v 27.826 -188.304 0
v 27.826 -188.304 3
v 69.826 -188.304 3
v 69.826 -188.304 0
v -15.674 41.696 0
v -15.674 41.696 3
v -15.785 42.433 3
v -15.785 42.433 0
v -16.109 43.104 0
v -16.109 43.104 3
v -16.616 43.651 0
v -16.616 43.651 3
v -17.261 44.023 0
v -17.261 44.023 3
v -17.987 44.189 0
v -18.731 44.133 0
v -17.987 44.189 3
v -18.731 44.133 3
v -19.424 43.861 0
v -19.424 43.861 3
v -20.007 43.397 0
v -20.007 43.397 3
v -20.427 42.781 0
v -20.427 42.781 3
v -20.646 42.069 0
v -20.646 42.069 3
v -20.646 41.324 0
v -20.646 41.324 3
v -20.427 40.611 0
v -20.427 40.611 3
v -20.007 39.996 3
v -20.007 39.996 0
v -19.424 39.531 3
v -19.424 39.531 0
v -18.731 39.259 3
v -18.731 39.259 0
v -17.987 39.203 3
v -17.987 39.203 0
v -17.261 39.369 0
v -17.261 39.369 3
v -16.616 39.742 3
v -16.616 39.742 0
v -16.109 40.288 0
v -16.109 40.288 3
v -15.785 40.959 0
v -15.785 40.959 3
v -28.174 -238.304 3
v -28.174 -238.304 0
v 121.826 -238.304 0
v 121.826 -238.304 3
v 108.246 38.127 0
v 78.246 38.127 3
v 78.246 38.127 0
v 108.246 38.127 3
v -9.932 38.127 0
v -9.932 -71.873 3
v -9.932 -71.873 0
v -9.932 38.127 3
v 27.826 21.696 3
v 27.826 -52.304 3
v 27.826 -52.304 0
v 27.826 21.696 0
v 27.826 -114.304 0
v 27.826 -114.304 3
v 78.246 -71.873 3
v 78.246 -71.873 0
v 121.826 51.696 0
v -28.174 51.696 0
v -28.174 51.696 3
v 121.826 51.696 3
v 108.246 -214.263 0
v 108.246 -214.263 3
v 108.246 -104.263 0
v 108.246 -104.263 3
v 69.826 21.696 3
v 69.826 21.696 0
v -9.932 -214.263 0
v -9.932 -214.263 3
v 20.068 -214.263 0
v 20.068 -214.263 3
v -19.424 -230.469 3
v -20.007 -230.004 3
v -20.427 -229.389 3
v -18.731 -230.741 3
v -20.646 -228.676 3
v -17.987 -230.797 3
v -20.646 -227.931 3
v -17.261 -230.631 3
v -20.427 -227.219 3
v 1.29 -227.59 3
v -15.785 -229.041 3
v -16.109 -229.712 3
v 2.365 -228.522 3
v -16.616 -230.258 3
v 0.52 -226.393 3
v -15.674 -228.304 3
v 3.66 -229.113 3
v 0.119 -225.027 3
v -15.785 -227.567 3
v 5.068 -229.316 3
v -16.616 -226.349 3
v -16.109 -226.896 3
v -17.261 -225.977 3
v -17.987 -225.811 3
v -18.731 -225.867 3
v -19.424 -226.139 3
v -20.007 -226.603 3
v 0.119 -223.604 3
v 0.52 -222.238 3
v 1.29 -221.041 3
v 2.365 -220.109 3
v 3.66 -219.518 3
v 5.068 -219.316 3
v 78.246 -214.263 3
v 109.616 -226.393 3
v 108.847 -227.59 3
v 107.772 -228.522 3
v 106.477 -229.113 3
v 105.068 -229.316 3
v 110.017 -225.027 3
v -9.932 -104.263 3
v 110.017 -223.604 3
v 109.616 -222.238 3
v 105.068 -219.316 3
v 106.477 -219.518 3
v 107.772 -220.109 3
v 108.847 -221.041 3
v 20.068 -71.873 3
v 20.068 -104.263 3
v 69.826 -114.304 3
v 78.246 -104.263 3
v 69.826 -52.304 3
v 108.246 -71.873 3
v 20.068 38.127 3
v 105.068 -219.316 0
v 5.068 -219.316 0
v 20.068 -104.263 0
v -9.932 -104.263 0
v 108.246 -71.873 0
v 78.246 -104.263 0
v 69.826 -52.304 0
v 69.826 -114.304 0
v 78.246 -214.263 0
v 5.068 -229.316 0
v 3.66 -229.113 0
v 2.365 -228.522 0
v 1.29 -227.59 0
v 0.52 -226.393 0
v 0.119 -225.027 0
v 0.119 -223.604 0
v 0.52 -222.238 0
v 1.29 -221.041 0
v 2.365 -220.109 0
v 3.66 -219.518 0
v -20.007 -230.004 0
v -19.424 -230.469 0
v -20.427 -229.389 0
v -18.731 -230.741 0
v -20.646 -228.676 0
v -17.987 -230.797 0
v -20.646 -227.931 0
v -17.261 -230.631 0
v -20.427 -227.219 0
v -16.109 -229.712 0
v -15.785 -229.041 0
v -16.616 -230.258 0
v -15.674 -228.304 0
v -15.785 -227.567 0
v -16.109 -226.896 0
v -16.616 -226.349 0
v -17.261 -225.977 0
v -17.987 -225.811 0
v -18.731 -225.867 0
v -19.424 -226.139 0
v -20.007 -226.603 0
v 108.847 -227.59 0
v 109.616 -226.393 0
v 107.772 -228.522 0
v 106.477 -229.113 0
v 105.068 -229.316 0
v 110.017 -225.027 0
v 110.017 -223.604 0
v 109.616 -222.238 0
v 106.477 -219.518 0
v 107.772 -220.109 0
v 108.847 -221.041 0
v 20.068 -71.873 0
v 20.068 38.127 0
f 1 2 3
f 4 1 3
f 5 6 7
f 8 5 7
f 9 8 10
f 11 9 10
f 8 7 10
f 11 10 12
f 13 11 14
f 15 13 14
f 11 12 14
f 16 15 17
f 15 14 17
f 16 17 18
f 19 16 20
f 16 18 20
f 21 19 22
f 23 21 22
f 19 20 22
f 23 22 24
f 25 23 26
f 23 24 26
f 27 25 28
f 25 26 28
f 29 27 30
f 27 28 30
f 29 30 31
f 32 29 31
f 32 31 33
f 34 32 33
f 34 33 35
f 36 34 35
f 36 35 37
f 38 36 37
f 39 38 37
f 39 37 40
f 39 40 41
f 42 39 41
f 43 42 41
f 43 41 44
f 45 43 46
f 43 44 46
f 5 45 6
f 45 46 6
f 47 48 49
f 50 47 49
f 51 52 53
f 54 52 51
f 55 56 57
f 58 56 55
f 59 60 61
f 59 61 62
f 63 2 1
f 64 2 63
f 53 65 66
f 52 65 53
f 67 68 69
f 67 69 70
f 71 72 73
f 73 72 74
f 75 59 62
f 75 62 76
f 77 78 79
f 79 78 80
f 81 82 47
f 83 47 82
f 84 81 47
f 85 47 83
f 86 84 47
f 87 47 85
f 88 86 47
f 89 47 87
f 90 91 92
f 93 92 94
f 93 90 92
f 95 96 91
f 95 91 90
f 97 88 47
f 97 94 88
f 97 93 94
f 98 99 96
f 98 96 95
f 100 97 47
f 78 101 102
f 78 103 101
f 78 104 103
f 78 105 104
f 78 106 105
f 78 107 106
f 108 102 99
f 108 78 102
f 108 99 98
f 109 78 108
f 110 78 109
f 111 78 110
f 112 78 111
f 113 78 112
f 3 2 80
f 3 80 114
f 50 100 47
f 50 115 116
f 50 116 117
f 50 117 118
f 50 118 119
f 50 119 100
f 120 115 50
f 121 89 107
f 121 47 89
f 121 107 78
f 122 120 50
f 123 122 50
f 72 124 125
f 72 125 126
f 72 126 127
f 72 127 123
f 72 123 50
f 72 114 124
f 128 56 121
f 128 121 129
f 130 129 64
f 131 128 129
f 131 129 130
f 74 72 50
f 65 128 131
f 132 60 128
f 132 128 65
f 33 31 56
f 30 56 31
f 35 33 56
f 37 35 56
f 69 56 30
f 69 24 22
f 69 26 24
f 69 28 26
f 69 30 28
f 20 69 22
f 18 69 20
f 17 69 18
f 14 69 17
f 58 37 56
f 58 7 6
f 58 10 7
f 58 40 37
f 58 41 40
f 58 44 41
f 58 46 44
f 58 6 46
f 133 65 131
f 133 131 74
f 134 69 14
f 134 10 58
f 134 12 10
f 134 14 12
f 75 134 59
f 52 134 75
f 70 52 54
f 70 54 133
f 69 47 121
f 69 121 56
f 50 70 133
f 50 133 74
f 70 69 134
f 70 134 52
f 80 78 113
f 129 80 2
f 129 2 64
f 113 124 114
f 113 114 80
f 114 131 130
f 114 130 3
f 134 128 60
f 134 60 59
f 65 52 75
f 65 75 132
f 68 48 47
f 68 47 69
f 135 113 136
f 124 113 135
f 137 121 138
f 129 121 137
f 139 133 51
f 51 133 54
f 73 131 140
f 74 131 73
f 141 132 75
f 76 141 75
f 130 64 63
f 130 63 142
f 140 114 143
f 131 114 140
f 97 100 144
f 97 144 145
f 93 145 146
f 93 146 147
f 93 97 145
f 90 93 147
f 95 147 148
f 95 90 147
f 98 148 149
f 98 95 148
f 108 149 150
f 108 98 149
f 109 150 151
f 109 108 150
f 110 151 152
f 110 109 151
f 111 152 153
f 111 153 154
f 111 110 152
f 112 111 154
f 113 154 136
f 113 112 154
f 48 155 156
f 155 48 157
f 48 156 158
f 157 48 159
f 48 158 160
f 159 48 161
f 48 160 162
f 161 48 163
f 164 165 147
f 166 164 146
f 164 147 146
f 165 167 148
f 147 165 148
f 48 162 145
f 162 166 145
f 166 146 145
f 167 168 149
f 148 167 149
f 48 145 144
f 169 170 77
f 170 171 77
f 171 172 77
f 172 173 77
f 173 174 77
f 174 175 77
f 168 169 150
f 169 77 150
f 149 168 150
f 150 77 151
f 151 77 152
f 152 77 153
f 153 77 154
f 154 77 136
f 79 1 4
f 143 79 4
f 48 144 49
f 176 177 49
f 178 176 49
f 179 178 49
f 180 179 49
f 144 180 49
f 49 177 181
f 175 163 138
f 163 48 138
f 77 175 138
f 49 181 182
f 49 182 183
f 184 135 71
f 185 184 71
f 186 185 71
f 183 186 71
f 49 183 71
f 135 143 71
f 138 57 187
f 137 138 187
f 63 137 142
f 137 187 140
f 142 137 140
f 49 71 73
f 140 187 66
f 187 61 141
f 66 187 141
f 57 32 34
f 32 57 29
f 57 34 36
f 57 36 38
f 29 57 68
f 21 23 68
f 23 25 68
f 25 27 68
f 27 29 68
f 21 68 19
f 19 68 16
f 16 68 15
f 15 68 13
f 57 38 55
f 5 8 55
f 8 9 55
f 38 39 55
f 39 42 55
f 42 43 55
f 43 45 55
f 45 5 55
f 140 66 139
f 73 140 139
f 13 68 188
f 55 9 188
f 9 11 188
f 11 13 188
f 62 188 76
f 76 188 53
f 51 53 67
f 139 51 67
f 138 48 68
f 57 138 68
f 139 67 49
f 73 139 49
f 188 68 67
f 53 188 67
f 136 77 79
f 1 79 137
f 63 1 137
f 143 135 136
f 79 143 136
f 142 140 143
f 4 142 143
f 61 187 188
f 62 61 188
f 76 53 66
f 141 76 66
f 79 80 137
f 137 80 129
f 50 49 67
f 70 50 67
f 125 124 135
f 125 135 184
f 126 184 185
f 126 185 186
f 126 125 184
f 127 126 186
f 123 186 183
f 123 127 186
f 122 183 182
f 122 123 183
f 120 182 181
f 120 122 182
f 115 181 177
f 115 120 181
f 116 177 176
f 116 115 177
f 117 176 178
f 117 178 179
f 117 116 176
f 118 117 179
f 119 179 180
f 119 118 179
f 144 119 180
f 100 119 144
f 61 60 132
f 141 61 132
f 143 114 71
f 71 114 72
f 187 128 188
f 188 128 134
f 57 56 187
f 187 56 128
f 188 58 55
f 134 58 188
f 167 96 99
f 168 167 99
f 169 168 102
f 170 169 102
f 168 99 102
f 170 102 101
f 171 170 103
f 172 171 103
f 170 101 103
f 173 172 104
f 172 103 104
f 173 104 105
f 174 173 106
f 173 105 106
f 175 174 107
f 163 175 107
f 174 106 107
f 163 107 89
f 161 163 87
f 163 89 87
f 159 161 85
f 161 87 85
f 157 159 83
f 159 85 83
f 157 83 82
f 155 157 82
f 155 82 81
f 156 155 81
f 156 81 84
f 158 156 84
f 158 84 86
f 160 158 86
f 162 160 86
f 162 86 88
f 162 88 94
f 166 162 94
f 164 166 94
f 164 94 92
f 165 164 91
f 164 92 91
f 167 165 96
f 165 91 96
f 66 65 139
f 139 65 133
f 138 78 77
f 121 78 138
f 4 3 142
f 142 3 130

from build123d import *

# Parameters (mm, degrees)
SKETCH_2_W          = 150
SKETCH_2_H          = 290
EXTRUDE_1_DEPTH     = 3
SKETCH_3_W          = 42
SKETCH_3_H          = 74
CUT_EXTRUDE_1_DEPTH = 3
SKETCH_4_R          = 2.5
CUT_EXTRUDE_2_DEPTH = 3
SKETCH_5_W          = 30
SKETCH_5_H          = 110
CUT_EXTRUDE_3_DEPTH = 3
CUT_EXTRUDE_4_DEPTH = 3


with BuildPart() as part:
    # 草图2 → 凸台-拉伸1 (new body)
    with BuildSketch(Plane.XY):
        with Locations((46.825741224, -93.303848435)):
            Rectangle(SKETCH_2_W, SKETCH_2_H)
    extrude(amount=EXTRUDE_1_DEPTH)

    # 草图3 → 切除-拉伸1 (cut)
    with BuildSketch(Plane.XY.offset(3)):
        with Locations((48.825741224, -15.303848435)):
            Rectangle(SKETCH_3_W, SKETCH_3_H)
        with Locations((48.825741224, -151.303848435)):
            Rectangle(SKETCH_3_W, SKETCH_3_H)
    extrude(amount=-CUT_EXTRUDE_1_DEPTH, mode=Mode.SUBTRACT)

    # 草图4 → 切除-拉伸2 (cut)
    with BuildSketch(Plane.XY.offset(3)):
        with Locations((-18.174258776, 41.696151565)):
            Circle(SKETCH_4_R)
        with Locations((-18.174258776, -228.303848435)):
            Circle(SKETCH_4_R)
    extrude(amount=-CUT_EXTRUDE_2_DEPTH, mode=Mode.SUBTRACT)

    # 草图5 → 切除-拉伸3 (cut)
    with BuildSketch(Plane.XY.offset(3)):
        with Locations((5.068322333, -16.872516049)):
            Rectangle(SKETCH_5_W, SKETCH_5_H)
        with Locations((93.246188271, -16.872516049)):
            Rectangle(SKETCH_5_W, SKETCH_5_H)
        with Locations((5.068322333, -159.262913685)):
            Rectangle(SKETCH_5_W, SKETCH_5_H)
        with Locations((93.246188271, -159.262913685)):
            Rectangle(SKETCH_5_W, SKETCH_5_H)
    extrude(amount=-CUT_EXTRUDE_3_DEPTH, mode=Mode.SUBTRACT)

    # 草图6 → 切除-拉伸4 (cut)
    with BuildSketch(Plane.XY.offset(3)):
        with BuildLine():
            Line((5.068322333, -219.315553818), (105.068322333, -219.315553818))
            ThreePointArc((105.068322333, -219.315553818), (110.068322333, -224.315553818), (105.068322333, -229.315553818))
            Line((105.068322333, -229.315553818), (5.068322333, -229.315553818))
            ThreePointArc((5.068322333, -229.315553818), (0.068322333, -224.315553818), (5.068322333, -219.315553818))
        make_face()
    extrude(amount=-CUT_EXTRUDE_4_DEPTH, mode=Mode.SUBTRACT)


solid = part.part
